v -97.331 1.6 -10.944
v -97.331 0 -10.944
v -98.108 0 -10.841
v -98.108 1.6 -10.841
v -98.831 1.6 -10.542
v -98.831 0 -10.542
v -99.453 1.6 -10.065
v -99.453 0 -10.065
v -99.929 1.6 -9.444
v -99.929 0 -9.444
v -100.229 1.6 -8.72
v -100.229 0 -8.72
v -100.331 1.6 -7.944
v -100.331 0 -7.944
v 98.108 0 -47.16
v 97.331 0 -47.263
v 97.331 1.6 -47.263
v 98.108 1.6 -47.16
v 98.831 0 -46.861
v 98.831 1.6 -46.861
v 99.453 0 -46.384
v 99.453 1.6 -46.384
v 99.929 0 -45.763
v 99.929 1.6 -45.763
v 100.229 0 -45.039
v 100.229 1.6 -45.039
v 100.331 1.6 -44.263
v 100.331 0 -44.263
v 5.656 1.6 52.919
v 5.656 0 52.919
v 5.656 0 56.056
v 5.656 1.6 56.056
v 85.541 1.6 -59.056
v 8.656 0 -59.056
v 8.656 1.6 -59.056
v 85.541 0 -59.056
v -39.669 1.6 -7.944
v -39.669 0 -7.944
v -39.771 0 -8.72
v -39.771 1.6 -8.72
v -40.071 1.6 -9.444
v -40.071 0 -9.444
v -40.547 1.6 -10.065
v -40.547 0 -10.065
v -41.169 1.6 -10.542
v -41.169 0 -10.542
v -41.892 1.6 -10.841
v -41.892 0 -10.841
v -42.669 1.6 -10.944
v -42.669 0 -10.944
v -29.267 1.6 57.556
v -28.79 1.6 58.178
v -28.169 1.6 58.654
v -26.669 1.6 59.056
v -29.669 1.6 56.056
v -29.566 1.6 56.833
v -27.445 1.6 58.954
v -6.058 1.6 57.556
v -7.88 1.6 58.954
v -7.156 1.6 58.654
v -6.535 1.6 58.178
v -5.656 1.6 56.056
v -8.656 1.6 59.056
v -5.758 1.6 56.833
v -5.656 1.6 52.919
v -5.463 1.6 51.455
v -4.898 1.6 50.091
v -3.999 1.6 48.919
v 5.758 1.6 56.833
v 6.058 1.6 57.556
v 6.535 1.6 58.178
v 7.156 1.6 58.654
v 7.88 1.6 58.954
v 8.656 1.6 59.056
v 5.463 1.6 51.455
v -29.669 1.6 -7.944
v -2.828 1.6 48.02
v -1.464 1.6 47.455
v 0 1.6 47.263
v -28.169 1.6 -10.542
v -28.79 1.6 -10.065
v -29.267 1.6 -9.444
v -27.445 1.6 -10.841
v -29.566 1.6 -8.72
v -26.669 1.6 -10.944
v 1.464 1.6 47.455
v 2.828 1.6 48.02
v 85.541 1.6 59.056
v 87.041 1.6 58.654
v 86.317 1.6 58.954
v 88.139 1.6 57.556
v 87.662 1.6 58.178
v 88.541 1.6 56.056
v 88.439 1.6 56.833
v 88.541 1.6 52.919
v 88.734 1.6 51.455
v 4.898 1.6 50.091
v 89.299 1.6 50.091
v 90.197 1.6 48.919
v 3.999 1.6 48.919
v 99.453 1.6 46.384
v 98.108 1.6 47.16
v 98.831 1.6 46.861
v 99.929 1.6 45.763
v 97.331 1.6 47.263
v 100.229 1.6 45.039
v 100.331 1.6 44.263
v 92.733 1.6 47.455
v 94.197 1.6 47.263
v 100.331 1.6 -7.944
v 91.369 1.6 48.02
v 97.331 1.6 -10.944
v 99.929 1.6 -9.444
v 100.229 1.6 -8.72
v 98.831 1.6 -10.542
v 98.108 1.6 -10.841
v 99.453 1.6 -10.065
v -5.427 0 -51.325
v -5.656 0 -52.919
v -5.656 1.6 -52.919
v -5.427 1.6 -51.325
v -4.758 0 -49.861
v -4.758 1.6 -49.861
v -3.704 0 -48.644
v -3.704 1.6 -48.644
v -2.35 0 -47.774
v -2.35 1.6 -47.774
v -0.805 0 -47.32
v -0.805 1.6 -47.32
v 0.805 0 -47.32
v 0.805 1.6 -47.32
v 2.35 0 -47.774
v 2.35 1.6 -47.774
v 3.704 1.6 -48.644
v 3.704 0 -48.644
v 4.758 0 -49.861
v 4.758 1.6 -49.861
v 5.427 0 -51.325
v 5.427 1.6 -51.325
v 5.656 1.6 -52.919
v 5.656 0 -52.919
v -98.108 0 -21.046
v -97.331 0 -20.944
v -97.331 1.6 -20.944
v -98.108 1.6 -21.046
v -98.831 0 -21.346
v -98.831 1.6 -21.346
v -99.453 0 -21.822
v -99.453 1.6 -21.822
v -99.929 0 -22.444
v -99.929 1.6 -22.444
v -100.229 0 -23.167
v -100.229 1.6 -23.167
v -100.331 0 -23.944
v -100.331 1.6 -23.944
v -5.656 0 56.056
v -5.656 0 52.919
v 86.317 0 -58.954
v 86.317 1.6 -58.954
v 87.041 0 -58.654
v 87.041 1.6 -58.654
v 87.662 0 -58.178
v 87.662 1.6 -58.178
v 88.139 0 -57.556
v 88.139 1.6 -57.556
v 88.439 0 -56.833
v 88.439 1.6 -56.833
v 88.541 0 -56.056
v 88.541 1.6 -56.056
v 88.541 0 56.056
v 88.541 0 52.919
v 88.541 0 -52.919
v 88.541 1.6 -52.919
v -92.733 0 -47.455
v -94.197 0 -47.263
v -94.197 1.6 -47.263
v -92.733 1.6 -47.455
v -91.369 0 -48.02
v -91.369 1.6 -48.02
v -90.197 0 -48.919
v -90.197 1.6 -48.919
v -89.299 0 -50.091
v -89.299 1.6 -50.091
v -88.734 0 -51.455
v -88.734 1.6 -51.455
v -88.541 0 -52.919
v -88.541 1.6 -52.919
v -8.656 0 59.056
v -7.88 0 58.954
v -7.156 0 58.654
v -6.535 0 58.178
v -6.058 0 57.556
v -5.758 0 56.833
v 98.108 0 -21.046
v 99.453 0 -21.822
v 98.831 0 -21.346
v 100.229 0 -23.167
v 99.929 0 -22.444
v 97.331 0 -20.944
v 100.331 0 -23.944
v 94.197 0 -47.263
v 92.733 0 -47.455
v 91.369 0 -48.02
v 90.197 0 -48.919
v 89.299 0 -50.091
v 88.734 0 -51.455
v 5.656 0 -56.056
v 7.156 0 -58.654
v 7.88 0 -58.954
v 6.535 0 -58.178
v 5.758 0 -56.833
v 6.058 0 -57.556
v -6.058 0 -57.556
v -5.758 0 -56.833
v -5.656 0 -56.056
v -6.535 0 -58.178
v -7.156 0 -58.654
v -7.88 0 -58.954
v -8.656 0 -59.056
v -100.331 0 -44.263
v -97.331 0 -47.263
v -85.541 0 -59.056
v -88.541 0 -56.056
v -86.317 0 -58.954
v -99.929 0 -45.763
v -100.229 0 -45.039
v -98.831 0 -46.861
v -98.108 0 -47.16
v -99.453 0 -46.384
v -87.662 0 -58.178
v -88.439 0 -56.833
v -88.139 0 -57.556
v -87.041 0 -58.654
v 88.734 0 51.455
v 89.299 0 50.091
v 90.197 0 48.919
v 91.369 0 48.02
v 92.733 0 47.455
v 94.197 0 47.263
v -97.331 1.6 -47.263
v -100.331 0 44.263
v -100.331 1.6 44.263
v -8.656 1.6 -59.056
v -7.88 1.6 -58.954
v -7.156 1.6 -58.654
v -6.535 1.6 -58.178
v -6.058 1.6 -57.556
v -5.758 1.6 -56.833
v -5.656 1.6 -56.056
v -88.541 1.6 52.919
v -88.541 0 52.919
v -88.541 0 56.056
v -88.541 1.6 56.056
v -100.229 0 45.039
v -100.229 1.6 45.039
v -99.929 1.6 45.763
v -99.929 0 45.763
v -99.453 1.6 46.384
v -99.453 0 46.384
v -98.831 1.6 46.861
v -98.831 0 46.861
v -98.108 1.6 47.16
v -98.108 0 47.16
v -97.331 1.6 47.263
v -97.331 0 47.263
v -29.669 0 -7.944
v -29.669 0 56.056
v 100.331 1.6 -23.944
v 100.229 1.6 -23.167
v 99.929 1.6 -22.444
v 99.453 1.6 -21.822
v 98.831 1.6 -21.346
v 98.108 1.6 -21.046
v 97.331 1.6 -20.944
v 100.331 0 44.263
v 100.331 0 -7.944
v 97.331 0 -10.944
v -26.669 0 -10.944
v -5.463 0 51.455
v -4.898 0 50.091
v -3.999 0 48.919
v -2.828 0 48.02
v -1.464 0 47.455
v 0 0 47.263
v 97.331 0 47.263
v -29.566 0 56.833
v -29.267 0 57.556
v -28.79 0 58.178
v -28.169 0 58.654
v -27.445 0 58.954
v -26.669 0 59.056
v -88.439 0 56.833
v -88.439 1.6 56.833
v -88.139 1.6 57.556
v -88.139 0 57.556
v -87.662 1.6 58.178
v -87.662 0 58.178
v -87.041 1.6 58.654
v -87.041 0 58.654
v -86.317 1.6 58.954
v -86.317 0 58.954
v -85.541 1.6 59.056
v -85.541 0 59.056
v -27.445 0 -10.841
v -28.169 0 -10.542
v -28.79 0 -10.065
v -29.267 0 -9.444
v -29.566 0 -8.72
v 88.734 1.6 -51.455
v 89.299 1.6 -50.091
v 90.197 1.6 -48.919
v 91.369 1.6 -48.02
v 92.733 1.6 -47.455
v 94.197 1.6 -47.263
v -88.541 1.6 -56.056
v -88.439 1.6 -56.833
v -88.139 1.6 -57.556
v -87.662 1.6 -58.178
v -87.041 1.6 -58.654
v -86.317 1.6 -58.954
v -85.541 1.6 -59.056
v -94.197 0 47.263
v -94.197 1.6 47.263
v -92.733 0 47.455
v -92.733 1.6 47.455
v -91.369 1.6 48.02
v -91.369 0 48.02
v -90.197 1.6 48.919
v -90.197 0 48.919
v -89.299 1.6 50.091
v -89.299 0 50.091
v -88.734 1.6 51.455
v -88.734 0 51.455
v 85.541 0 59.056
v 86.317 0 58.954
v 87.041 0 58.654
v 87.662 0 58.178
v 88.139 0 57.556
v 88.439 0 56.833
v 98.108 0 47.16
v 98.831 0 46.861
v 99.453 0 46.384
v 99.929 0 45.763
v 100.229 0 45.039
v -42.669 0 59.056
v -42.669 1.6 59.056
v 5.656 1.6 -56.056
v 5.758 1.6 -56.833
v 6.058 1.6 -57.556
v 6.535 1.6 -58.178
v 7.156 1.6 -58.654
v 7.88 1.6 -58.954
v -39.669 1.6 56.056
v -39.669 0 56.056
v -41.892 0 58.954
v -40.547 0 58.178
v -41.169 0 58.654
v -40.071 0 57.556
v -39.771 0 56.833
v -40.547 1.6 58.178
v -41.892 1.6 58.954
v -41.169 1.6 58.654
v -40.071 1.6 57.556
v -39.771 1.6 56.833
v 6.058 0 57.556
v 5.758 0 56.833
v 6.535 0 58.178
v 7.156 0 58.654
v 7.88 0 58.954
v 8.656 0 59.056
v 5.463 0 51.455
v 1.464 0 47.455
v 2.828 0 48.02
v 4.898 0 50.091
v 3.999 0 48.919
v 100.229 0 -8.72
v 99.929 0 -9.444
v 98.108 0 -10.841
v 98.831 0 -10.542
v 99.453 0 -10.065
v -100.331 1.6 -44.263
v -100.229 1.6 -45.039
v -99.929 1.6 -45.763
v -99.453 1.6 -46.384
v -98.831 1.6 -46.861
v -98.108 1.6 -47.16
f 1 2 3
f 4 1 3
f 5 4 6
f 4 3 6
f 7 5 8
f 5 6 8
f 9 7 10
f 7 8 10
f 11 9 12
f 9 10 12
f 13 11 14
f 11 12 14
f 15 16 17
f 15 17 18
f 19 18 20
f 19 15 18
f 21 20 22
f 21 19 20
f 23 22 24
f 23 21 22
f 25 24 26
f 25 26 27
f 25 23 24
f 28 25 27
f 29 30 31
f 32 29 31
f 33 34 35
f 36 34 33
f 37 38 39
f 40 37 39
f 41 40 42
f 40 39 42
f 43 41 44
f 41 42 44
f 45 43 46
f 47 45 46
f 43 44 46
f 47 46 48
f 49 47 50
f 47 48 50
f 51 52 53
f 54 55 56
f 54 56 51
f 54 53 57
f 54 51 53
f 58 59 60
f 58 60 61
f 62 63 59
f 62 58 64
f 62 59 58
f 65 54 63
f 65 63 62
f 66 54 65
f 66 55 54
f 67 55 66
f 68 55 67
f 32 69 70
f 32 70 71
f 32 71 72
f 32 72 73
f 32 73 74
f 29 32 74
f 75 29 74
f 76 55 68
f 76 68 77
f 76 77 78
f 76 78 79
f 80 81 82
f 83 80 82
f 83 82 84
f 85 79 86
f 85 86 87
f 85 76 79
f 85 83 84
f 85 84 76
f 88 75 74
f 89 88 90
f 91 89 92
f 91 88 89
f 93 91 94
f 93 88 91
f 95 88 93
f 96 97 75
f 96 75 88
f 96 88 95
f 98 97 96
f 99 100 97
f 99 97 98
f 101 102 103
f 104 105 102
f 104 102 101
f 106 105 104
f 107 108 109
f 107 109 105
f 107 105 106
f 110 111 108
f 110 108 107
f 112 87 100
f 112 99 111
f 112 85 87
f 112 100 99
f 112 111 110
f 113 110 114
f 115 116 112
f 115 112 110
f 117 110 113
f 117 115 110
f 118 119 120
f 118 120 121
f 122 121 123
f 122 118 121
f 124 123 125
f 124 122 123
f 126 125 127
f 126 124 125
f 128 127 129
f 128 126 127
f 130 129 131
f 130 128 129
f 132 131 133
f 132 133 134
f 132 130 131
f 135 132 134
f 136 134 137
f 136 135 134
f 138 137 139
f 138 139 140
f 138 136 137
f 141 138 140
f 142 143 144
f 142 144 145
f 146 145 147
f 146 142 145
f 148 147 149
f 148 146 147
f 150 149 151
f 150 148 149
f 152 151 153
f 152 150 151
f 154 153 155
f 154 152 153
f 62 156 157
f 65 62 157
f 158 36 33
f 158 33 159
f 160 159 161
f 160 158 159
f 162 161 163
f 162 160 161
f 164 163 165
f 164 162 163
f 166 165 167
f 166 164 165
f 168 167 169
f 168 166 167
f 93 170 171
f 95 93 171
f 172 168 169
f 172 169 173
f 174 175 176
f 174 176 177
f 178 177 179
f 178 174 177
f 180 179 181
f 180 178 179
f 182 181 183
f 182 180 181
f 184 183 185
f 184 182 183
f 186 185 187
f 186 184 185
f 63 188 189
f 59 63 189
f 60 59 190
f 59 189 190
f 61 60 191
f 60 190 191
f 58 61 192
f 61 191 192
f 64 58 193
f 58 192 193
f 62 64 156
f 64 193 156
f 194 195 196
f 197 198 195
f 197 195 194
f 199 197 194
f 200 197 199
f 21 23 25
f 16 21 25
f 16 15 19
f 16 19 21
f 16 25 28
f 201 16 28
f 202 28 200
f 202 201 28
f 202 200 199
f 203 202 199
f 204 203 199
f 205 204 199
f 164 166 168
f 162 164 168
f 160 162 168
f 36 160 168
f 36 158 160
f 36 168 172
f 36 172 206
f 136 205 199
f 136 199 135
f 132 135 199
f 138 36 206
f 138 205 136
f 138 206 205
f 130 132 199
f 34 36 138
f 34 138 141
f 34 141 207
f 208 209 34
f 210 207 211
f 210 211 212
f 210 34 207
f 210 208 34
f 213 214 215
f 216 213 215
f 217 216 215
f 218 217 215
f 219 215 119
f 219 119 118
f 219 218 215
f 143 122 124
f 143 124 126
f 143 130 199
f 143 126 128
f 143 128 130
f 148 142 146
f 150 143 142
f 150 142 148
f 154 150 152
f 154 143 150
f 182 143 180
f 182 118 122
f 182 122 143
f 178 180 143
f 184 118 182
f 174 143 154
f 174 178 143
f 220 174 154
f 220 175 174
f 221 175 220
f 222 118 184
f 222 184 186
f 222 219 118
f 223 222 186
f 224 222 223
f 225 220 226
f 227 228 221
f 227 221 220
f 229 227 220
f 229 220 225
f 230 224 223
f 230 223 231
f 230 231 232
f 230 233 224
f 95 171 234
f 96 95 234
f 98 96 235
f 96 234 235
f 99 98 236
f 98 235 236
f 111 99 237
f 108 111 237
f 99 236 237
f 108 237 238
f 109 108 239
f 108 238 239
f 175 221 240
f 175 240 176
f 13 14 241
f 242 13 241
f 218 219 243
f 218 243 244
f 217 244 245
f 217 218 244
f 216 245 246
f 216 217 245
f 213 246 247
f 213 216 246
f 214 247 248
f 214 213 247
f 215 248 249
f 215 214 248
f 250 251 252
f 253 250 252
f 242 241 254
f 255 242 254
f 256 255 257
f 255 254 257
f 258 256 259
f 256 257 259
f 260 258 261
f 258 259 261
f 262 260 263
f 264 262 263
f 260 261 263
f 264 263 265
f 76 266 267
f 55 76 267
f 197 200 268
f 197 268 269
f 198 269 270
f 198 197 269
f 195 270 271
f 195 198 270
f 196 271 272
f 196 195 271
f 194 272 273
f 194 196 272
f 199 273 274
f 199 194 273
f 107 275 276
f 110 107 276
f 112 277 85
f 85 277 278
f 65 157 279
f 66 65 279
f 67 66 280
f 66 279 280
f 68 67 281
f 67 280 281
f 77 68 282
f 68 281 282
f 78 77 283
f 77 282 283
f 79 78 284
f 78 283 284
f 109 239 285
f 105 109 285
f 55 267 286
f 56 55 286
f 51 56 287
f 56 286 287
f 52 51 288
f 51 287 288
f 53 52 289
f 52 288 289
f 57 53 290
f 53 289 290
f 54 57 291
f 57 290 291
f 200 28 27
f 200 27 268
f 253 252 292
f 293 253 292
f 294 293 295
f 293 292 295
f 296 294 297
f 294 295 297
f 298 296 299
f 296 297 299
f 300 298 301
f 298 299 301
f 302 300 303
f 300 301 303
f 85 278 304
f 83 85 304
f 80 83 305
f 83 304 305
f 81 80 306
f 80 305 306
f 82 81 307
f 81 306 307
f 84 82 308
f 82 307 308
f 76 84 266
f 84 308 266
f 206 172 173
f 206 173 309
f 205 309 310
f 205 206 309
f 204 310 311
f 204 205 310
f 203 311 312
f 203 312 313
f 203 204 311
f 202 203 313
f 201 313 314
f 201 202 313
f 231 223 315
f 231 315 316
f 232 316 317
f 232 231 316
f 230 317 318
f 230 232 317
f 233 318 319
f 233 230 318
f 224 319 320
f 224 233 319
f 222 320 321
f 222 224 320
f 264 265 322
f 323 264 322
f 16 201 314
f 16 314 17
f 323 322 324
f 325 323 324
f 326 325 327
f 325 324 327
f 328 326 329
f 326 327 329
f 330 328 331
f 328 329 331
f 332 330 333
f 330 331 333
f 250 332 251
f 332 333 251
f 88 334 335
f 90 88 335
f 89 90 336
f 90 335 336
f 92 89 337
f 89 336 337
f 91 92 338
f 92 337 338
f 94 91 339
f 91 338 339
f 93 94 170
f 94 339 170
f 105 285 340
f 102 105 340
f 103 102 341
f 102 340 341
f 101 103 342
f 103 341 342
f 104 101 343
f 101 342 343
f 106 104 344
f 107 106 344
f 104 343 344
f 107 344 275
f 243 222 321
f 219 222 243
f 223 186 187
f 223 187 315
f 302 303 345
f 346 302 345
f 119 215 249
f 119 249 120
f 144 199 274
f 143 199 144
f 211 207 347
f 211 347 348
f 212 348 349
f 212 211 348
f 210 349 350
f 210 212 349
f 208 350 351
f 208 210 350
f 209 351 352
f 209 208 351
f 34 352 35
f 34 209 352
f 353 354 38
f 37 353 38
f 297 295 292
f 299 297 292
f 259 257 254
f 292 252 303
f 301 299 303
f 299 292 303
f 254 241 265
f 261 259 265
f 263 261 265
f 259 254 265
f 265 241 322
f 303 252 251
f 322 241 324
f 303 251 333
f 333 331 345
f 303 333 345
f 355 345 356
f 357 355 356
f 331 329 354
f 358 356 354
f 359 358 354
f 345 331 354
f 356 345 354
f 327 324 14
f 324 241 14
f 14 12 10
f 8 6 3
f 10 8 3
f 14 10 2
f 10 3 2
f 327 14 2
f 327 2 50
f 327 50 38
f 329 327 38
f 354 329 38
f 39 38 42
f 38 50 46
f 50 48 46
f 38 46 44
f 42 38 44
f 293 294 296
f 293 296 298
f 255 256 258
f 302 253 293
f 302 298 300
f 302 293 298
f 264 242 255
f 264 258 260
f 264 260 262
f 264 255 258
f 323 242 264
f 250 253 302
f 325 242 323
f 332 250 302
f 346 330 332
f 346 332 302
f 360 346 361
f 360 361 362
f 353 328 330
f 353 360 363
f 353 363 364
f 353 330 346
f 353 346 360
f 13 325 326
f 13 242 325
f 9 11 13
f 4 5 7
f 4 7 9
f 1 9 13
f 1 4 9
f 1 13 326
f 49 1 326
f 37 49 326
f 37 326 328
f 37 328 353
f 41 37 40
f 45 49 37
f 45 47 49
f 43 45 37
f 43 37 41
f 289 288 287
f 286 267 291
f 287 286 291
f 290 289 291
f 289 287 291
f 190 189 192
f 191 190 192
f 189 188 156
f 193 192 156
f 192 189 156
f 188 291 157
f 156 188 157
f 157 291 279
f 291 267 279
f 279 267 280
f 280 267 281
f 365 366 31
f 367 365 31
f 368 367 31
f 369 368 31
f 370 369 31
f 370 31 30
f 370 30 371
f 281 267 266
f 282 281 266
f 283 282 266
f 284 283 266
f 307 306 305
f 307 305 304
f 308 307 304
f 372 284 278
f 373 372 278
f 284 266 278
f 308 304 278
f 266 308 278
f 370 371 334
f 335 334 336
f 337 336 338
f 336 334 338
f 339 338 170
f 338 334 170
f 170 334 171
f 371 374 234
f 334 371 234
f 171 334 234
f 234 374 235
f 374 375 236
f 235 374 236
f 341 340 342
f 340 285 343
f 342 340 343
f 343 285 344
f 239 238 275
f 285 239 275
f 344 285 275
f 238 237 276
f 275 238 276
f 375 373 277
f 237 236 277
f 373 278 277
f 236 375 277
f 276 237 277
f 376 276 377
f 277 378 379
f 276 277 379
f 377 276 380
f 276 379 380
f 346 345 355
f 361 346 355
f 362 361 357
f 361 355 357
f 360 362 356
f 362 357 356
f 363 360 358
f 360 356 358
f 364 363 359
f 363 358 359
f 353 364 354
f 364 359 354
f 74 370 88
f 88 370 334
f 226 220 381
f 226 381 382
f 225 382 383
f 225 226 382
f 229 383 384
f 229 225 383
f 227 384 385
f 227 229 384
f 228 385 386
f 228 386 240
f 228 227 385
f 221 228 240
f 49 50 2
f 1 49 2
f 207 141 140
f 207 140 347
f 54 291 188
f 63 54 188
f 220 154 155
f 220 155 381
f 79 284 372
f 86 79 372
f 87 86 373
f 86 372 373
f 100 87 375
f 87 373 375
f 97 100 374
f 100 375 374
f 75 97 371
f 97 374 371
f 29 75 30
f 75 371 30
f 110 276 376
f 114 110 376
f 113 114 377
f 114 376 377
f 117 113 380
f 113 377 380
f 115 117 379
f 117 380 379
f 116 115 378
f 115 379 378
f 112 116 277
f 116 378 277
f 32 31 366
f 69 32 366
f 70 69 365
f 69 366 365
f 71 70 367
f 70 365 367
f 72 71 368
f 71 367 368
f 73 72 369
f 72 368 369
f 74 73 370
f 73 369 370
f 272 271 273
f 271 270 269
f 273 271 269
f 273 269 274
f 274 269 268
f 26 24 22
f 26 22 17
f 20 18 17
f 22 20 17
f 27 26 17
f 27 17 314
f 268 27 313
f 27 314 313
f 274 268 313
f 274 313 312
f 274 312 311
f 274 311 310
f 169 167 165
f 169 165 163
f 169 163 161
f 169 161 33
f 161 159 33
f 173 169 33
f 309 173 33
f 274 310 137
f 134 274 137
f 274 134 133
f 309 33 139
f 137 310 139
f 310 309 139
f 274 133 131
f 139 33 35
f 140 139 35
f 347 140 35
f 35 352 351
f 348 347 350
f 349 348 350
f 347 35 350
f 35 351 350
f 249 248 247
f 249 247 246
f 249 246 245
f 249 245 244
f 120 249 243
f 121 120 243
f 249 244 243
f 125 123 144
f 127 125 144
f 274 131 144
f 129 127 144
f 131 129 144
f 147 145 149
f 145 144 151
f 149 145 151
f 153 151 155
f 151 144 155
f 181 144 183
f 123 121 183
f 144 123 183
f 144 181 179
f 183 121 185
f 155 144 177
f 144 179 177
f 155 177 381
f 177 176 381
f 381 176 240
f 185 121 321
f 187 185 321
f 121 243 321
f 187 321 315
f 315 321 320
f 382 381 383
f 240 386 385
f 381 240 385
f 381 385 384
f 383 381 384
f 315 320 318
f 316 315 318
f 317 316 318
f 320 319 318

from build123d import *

# Parameters (mm, degrees)
BOSS_EXTRUDE1_DEPTH   = 1.6
BOSS_EXTRUDE1_2_DEPTH = 1.6
BOSS_EXTRUDE1_3_DEPTH = 1.6


with BuildPart() as part:
    # Sketch1 → Boss-Extrude1 (new body)
    with BuildSketch(Plane(origin=(0, 0, 0), x_dir=(1, 0, 0), z_dir=(0, 1, 0))):
        with BuildLine():
            ThreePointArc((5.656122312, -56.056304816), (6.534801968, -58.17762516), (8.656122312, -59.056304816))
            Line((8.656122312, -59.056304816), (85.540799201, -59.056304816))
            ThreePointArc((85.540799201, -59.056304816), (87.662119545, -58.17762516), (88.540799201, -56.056304816))
            Line((88.540799201, -56.056304816), (88.540799201, -52.918768599))
            ThreePointArc((88.540799201, -52.918768599), (90.197439071, -48.919286157), (94.196921513, -47.262646288))
            Line((94.196921513, -47.262646288), (97.331304816, -47.262646288))
            ThreePointArc((97.331304816, -47.262646288), (99.45262516, -46.383966631), (100.331304816, -44.262646288))
            Line((100.331304816, -44.262646288), (100.331304816, 7.943695184))
            ThreePointArc((100.331304816, 7.943695184), (99.45262516, 10.065015527), (97.331304816, 10.943695184))
            Line((97.331304816, 10.943695184), (-26.668695184, 10.943695184))
            ThreePointArc((-26.668695184, 10.943695184), (-28.790015527, 10.065015527), (-29.668695184, 7.943695184))
            Line((-29.668695184, 7.943695184), (-29.668695184, -56.056304816))
            ThreePointArc((-29.668695184, -56.056304816), (-28.790015527, -58.17762516), (-26.668695184, -59.056304816))
            Line((-26.668695184, -59.056304816), (-8.656122312, -59.056304816))
            ThreePointArc((-8.656122312, -59.056304816), (-6.534801968, -58.17762516), (-5.656122312, -56.056304816))
            Line((-5.656122312, -56.056304816), (-5.656122312, -52.918768599))
            ThreePointArc((-5.656122312, -52.918768599), (0, -47.262646288), (5.656122312, -52.918768599))
            Line((5.656122312, -52.918768599), (5.656122312, -56.056304816))
        make_face()
    extrude(amount=BOSS_EXTRUDE1_DEPTH)


with BuildPart() as body_2:
    # Sketch1 → Boss-Extrude1 2 (new body)
    with BuildSketch(Plane(origin=(0, 0, 0), x_dir=(1, 0, 0), z_dir=(0, 1, 0))):
        with BuildLine():
            Line((-8.656122312, 59.056304816), (-85.540799201, 59.056304816))
            ThreePointArc((-85.540799201, 59.056304816), (-87.662119545, 58.17762516), (-88.540799201, 56.056304816))
            Line((-88.540799201, 56.056304816), (-88.540799201, 52.918768599))
            ThreePointArc((-88.540799201, 52.918768599), (-90.197439071, 48.919286157), (-94.196921513, 47.262646288))
            Line((-94.196921513, 47.262646288), (-97.331304816, 47.262646288))
            ThreePointArc((-97.331304816, 47.262646288), (-99.45262516, 46.383966631), (-100.331304816, 44.262646288))
            Line((-100.331304816, 44.262646288), (-100.331304816, 23.943695184))
            ThreePointArc((-100.331304816, 23.943695184), (-99.45262516, 21.82237484), (-97.331304816, 20.943695184))
            Line((-97.331304816, 20.943695184), (97.331304816, 20.943695184))
            ThreePointArc((97.331304816, 20.943695184), (99.45262516, 21.82237484), (100.331304816, 23.943695184))
            Line((100.331304816, 23.943695184), (100.331304816, 44.262646288))
            ThreePointArc((100.331304816, 44.262646288), (99.45262516, 46.383966631), (97.331304816, 47.262646288))
            Line((97.331304816, 47.262646288), (94.196921513, 47.262646288))
            ThreePointArc((94.196921513, 47.262646288), (90.197439071, 48.919286157), (88.540799201, 52.918768599))
            Line((88.540799201, 52.918768599), (88.540799201, 56.056304816))
            ThreePointArc((88.540799201, 56.056304816), (87.662119545, 58.17762516), (85.540799201, 59.056304816))
            Line((85.540799201, 59.056304816), (8.656122312, 59.056304816))
            ThreePointArc((8.656122312, 59.056304816), (6.534801968, 58.17762516), (5.656122312, 56.056304816))
            Line((5.656122312, 56.056304816), (5.656122312, 52.918768599))
            ThreePointArc((5.656122312, 52.918768599), (0, 47.262646288), (-5.656122312, 52.918768599))
            Line((-5.656122312, 52.918768599), (-5.656122312, 56.056304816))
            ThreePointArc((-5.656122312, 56.056304816), (-6.534801968, 58.17762516), (-8.656122312, 59.056304816))
        make_face()
    extrude(amount=BOSS_EXTRUDE1_2_DEPTH)


with BuildPart() as body_3:
    # Sketch1 → Boss-Extrude1 3 (new body)
    with BuildSketch(Plane(origin=(0, 0, 0), x_dir=(1, 0, 0), z_dir=(0, 1, 0))):
        with BuildLine():
            Line((-42.668695184, 10.943695184), (-97.331304816, 10.943695184))
            ThreePointArc((-97.331304816, 10.943695184), (-99.45262516, 10.065015527), (-100.331304816, 7.943695184))
            Line((-100.331304816, 7.943695184), (-100.331304816, -44.262646288))
            ThreePointArc((-100.331304816, -44.262646288), (-99.45262516, -46.383966631), (-97.331304816, -47.262646288))
            Line((-97.331304816, -47.262646288), (-94.196921513, -47.262646288))
            ThreePointArc((-94.196921513, -47.262646288), (-90.197439071, -48.919286157), (-88.540799201, -52.918768599))
            Line((-88.540799201, -52.918768599), (-88.540799201, -56.056304816))
            ThreePointArc((-88.540799201, -56.056304816), (-87.662119545, -58.17762516), (-85.540799201, -59.056304816))
            Line((-85.540799201, -59.056304816), (-42.668695184, -59.056304816))
            ThreePointArc((-42.668695184, -59.056304816), (-40.54737484, -58.17762516), (-39.668695184, -56.056304816))
            Line((-39.668695184, -56.056304816), (-39.668695184, 7.943695184))
            ThreePointArc((-39.668695184, 7.943695184), (-40.54737484, 10.065015527), (-42.668695184, 10.943695184))
        make_face()
    extrude(amount=BOSS_EXTRUDE1_3_DEPTH)


solid = Compound([part.part, body_2.part, body_3.part])
